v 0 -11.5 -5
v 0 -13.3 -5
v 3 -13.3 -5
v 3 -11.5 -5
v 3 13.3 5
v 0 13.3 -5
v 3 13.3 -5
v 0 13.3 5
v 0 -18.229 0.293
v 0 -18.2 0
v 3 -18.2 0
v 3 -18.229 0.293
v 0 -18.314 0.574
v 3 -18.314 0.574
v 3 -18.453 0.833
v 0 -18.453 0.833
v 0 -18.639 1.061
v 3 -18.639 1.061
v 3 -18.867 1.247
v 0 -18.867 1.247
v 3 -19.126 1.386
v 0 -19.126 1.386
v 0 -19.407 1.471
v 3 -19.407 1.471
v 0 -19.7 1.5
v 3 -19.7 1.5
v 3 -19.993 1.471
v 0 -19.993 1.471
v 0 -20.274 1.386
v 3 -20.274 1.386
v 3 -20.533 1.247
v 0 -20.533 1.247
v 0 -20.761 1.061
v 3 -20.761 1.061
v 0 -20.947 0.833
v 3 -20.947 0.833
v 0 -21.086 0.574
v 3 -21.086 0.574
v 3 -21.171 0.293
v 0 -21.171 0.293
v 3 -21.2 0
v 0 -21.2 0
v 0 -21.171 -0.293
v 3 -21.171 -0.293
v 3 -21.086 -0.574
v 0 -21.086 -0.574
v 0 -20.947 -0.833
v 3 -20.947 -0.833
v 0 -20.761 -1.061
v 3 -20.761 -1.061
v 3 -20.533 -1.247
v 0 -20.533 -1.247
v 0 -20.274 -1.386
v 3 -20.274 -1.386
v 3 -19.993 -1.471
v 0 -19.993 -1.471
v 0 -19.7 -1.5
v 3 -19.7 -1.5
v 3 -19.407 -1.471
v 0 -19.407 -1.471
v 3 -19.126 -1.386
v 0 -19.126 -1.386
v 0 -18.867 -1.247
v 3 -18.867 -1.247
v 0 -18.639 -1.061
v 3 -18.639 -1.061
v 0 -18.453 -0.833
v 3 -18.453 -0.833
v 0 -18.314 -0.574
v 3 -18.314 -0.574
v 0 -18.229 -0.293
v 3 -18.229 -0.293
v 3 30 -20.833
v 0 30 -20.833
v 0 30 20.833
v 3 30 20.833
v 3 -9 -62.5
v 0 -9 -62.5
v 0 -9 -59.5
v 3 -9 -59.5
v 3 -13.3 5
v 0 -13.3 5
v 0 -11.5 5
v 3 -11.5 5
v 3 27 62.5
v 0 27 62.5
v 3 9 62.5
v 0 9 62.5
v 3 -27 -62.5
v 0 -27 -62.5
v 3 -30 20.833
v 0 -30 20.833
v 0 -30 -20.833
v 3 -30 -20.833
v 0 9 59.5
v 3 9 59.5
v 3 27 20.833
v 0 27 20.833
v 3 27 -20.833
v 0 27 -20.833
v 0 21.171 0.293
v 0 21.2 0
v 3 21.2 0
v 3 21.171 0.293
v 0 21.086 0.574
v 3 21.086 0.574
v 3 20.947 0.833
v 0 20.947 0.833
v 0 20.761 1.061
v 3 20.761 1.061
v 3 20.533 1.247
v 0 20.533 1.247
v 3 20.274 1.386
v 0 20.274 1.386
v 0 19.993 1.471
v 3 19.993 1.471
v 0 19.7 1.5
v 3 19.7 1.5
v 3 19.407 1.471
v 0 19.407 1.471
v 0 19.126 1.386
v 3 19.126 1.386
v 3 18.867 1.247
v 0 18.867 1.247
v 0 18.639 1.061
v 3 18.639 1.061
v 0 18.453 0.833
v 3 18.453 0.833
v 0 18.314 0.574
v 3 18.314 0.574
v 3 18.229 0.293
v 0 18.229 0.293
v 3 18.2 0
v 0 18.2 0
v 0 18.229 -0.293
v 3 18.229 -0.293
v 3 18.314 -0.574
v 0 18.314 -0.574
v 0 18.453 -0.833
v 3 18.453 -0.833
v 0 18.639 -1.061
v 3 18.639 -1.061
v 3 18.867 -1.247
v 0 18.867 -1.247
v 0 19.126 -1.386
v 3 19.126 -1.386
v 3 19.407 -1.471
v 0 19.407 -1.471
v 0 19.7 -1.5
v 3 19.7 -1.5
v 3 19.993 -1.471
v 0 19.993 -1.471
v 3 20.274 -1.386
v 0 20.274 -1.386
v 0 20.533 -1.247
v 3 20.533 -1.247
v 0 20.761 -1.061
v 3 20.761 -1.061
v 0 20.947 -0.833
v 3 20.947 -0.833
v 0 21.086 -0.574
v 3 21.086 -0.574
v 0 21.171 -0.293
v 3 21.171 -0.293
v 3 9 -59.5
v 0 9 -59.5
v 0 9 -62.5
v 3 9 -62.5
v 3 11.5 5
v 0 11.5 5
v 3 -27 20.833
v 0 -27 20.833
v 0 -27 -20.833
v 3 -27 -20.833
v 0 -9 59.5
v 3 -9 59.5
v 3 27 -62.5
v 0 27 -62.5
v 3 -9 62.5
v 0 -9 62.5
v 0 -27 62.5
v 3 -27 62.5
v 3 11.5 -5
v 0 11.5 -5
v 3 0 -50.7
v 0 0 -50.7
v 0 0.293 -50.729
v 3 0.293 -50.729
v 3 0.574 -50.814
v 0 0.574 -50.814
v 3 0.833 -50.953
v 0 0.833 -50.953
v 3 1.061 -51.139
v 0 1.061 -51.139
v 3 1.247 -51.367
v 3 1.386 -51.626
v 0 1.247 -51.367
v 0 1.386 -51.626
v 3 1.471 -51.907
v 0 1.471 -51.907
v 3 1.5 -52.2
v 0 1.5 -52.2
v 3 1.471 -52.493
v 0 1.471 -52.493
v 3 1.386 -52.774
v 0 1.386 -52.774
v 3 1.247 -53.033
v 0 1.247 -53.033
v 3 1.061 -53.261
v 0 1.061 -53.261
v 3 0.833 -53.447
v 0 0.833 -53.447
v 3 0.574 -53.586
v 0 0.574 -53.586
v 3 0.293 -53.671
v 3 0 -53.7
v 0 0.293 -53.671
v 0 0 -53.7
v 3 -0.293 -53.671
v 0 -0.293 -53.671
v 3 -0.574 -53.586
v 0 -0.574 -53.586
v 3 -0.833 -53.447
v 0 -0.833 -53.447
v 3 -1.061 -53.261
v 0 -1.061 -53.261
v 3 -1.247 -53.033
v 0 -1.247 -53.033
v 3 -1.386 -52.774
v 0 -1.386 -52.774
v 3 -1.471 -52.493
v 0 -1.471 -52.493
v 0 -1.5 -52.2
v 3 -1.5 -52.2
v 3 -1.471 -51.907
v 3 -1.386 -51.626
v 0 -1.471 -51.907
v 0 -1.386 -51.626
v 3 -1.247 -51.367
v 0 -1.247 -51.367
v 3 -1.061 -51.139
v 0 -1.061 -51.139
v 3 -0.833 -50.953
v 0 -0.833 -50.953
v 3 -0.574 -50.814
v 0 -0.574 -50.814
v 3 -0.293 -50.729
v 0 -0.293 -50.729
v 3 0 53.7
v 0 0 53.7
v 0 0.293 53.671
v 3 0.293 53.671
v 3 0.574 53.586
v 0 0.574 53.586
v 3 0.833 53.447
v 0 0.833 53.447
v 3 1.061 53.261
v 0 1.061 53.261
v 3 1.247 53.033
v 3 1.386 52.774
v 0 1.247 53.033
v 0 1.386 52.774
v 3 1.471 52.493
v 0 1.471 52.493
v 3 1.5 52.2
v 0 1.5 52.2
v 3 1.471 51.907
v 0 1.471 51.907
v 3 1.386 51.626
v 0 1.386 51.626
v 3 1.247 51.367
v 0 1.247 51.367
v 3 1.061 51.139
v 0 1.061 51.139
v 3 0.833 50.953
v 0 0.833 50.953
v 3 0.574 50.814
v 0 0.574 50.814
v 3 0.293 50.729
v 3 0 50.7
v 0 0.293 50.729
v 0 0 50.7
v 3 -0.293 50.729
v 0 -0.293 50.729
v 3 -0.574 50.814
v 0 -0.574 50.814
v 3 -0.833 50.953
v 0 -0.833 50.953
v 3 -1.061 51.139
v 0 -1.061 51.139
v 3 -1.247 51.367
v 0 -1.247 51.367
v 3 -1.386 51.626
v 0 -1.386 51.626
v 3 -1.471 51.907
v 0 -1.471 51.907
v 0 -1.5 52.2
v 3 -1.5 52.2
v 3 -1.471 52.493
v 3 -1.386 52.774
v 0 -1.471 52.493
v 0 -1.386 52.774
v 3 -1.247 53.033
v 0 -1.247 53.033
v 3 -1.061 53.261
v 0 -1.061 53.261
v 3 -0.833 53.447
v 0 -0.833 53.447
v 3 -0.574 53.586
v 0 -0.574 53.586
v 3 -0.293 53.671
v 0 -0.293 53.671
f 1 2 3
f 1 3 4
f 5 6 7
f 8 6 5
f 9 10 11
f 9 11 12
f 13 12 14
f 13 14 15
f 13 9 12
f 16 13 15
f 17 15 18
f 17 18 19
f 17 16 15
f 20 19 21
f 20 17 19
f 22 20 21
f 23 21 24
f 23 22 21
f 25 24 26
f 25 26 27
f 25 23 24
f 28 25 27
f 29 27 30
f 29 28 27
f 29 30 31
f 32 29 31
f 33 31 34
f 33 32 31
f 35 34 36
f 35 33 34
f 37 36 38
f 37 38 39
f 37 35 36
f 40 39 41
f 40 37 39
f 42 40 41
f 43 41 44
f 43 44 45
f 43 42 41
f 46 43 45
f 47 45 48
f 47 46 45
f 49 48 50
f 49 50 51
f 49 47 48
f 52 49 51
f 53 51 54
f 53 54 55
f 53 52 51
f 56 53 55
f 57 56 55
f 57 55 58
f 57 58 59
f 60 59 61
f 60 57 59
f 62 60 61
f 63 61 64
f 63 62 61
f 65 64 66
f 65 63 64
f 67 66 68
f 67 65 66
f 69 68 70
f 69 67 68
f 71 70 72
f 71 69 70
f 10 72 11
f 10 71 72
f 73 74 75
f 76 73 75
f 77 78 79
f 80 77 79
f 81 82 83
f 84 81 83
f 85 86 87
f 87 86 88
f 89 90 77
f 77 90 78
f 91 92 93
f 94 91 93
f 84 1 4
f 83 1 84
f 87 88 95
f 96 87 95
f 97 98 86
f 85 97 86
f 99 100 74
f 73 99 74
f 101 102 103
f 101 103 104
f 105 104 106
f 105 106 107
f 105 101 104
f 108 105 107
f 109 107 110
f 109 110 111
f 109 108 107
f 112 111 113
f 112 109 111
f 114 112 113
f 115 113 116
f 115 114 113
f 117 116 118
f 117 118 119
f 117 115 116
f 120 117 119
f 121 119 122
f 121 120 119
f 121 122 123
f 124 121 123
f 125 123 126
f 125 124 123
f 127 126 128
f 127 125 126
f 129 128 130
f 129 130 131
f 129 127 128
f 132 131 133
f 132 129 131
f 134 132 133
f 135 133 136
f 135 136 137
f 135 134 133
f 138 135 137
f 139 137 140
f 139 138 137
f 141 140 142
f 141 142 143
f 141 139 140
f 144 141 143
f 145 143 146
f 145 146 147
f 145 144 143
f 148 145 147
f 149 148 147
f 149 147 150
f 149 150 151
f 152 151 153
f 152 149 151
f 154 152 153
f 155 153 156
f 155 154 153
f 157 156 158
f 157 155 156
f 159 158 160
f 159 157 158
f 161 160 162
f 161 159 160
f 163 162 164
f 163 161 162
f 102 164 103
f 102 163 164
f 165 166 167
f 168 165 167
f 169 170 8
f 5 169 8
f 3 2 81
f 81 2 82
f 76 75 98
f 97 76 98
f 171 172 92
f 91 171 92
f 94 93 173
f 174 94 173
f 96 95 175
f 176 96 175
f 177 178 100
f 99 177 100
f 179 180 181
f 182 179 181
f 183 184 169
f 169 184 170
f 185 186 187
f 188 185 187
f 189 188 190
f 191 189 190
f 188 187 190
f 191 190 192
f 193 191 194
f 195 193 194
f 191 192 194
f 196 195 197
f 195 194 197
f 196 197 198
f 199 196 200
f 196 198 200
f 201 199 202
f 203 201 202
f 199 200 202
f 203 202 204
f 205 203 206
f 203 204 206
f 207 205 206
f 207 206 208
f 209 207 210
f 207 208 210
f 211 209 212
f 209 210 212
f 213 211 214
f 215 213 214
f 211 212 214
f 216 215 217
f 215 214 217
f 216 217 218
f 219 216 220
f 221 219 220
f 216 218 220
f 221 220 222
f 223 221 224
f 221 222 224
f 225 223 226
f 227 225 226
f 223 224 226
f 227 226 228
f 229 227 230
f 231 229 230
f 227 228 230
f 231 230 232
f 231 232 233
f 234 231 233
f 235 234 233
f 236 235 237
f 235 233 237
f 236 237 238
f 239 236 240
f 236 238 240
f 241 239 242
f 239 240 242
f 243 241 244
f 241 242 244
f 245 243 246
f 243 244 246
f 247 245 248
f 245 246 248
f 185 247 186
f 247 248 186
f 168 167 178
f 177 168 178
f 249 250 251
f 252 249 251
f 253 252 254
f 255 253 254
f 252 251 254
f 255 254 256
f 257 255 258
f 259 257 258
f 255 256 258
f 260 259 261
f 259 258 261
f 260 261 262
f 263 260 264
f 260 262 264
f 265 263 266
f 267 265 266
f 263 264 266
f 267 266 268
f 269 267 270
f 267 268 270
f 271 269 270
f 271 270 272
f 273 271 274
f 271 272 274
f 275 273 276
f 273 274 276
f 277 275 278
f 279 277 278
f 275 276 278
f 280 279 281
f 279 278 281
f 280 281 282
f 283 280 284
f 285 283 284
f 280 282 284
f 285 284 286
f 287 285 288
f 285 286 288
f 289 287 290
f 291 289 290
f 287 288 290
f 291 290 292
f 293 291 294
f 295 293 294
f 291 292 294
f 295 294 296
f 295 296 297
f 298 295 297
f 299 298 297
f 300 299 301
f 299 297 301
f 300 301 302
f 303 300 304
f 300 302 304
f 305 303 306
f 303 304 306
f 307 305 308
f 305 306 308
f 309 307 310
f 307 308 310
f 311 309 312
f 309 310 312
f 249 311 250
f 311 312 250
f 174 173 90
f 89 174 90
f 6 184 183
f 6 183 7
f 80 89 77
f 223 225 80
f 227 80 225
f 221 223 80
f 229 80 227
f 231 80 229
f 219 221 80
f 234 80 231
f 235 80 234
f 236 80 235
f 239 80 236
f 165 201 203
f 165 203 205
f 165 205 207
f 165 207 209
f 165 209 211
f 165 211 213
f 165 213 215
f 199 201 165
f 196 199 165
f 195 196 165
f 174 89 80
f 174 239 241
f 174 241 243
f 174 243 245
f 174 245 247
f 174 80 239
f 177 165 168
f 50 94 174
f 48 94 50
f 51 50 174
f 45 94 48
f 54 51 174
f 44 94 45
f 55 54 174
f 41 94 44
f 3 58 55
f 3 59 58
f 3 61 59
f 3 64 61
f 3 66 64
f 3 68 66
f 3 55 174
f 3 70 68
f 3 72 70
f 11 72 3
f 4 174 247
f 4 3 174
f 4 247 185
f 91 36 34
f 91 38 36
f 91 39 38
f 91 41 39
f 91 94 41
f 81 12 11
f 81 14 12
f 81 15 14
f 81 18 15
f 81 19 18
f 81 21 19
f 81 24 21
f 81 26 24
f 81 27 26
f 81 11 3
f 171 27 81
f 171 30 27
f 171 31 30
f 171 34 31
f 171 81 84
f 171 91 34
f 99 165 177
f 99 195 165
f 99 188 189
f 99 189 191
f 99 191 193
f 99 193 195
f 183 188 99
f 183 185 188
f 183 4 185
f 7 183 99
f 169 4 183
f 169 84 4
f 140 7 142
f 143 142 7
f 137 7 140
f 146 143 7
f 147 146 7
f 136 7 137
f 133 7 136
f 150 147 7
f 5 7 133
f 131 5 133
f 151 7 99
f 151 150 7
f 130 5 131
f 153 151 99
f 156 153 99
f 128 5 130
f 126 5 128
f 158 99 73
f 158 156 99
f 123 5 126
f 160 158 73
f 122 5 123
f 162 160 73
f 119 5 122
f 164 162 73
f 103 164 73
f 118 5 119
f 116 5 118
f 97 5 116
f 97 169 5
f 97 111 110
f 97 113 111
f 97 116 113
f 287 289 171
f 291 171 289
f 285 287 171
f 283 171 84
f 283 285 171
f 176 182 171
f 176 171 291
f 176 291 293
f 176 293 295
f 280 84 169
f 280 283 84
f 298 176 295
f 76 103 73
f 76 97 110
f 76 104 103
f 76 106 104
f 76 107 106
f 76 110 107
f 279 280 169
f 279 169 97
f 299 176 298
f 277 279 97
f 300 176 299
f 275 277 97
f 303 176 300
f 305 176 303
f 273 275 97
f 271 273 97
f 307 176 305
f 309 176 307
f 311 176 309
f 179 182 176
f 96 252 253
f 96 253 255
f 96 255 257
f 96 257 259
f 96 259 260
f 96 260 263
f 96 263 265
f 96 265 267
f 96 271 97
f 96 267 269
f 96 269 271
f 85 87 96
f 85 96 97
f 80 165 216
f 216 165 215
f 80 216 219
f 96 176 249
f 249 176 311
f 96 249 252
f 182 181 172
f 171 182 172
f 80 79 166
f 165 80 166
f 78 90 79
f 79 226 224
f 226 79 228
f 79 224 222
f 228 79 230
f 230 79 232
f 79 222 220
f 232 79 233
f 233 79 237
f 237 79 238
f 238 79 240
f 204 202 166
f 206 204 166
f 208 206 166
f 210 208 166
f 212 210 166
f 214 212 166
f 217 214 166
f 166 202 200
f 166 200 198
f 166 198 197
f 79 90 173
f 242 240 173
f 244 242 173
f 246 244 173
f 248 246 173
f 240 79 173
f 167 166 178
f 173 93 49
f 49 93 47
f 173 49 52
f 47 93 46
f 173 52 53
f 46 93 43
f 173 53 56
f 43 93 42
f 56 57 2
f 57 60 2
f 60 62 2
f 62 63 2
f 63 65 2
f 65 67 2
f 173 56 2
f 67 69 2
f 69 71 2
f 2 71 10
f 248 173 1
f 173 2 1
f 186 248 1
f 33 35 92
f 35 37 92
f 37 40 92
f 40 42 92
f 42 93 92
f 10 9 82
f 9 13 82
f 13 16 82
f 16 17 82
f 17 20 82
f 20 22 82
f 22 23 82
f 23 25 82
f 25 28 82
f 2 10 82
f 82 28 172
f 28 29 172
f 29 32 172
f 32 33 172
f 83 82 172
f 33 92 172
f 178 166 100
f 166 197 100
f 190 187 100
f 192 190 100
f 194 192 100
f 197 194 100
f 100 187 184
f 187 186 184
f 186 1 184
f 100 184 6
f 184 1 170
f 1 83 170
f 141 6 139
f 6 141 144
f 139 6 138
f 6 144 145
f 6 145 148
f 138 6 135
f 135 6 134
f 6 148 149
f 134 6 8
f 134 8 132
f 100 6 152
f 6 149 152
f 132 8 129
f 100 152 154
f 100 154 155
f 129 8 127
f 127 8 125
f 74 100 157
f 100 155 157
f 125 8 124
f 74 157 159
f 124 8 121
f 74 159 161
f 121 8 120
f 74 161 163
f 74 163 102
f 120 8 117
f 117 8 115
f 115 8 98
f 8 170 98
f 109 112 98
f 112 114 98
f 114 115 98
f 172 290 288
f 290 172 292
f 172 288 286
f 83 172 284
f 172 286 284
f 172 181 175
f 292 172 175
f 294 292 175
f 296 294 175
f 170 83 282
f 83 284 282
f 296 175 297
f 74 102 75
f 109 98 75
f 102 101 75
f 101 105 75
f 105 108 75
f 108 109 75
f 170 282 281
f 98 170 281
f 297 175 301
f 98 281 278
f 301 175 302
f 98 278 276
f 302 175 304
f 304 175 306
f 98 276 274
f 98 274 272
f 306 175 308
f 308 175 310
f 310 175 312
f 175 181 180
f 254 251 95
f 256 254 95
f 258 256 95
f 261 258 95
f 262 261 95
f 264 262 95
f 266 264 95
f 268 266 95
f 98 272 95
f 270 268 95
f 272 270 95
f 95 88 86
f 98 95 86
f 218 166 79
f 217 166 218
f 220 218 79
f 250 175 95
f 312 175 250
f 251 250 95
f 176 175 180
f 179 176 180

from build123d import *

# Parameters (mm, degrees)
F0_R     = 1.5
F0_W     = 1.8
F0_H     = 10
F1_DEPTH = 3


with BuildPart() as f1:
    # F0 (on Right) → F1 (new body)
    with BuildSketch(Plane.YZ):
        with BuildLine():
            Line((-27, 20.833333), (-30, 20.833333))
            Line((-30, 20.833333), (-30, -20.833333))
            Line((-30, -20.833333), (-27, -20.833333))
            Line((-27, -20.833333), (-27, -62.5))
            Line((-27, -62.5), (-18, -62.5))
            Line((-18, -62.5), (-9, -62.5))
            Line((-9, -62.5), (-9, -59.5))
            Line((-9, -59.5), (0, -59.5))
            Line((0, -59.5), (0, -53.7))
            ThreePointArc((0, -53.7), (-1.5, -52.2), (0, -50.7))
            Line((0, -50.7), (0, 50.7))
            ThreePointArc((0, 50.7), (-1.5, 52.2), (0, 53.7))
            Line((0, 53.7), (0, 59.5))
            Line((0, 59.5), (-9, 59.5))
            Line((-9, 59.5), (-9, 62.5))
            Line((-9, 62.5), (-18, 62.5))
            Line((-18, 62.5), (-27, 62.5))
            Line((-27, 62.5), (-27, 20.833333))
        make_face()
        with Locations((-19.7, 0)):
            Circle(F0_R, mode=Mode.SUBTRACT)
        with Locations((-12.4, 0)):
            Rectangle(F0_W, F0_H, mode=Mode.SUBTRACT)
        with BuildLine():
            Line((9, 59.5), (0, 59.5))
            Line((0, 59.5), (0, 53.7))
            ThreePointArc((0, 53.7), (1.5, 52.2), (0, 50.7))
            Line((0, 50.7), (0, -50.7))
            ThreePointArc((0, -50.7), (1.5, -52.2), (0, -53.7))
            Line((0, -53.7), (0, -59.5))
            Line((0, -59.5), (9, -59.5))
            Line((9, -59.5), (9, -62.5))
            Line((9, -62.5), (18, -62.5))
            Line((18, -62.5), (27, -62.5))
            Line((27, -62.5), (27, -20.833333))
            Line((27, -20.833333), (30, -20.833333))
            Line((30, -20.833333), (30, 20.833333))
            Line((30, 20.833333), (27, 20.833333))
            Line((27, 20.833333), (27, 62.5))
            Line((27, 62.5), (18, 62.5))
            Line((18, 62.5), (9, 62.5))
            Line((9, 62.5), (9, 59.5))
        make_face()
        with Locations((12.4, 0)):
            Rectangle(F0_W, F0_H, mode=Mode.SUBTRACT)
        with Locations((19.7, 0)):
            Circle(F0_R, mode=Mode.SUBTRACT)
    extrude(amount=F1_DEPTH)


solid = f1.part
